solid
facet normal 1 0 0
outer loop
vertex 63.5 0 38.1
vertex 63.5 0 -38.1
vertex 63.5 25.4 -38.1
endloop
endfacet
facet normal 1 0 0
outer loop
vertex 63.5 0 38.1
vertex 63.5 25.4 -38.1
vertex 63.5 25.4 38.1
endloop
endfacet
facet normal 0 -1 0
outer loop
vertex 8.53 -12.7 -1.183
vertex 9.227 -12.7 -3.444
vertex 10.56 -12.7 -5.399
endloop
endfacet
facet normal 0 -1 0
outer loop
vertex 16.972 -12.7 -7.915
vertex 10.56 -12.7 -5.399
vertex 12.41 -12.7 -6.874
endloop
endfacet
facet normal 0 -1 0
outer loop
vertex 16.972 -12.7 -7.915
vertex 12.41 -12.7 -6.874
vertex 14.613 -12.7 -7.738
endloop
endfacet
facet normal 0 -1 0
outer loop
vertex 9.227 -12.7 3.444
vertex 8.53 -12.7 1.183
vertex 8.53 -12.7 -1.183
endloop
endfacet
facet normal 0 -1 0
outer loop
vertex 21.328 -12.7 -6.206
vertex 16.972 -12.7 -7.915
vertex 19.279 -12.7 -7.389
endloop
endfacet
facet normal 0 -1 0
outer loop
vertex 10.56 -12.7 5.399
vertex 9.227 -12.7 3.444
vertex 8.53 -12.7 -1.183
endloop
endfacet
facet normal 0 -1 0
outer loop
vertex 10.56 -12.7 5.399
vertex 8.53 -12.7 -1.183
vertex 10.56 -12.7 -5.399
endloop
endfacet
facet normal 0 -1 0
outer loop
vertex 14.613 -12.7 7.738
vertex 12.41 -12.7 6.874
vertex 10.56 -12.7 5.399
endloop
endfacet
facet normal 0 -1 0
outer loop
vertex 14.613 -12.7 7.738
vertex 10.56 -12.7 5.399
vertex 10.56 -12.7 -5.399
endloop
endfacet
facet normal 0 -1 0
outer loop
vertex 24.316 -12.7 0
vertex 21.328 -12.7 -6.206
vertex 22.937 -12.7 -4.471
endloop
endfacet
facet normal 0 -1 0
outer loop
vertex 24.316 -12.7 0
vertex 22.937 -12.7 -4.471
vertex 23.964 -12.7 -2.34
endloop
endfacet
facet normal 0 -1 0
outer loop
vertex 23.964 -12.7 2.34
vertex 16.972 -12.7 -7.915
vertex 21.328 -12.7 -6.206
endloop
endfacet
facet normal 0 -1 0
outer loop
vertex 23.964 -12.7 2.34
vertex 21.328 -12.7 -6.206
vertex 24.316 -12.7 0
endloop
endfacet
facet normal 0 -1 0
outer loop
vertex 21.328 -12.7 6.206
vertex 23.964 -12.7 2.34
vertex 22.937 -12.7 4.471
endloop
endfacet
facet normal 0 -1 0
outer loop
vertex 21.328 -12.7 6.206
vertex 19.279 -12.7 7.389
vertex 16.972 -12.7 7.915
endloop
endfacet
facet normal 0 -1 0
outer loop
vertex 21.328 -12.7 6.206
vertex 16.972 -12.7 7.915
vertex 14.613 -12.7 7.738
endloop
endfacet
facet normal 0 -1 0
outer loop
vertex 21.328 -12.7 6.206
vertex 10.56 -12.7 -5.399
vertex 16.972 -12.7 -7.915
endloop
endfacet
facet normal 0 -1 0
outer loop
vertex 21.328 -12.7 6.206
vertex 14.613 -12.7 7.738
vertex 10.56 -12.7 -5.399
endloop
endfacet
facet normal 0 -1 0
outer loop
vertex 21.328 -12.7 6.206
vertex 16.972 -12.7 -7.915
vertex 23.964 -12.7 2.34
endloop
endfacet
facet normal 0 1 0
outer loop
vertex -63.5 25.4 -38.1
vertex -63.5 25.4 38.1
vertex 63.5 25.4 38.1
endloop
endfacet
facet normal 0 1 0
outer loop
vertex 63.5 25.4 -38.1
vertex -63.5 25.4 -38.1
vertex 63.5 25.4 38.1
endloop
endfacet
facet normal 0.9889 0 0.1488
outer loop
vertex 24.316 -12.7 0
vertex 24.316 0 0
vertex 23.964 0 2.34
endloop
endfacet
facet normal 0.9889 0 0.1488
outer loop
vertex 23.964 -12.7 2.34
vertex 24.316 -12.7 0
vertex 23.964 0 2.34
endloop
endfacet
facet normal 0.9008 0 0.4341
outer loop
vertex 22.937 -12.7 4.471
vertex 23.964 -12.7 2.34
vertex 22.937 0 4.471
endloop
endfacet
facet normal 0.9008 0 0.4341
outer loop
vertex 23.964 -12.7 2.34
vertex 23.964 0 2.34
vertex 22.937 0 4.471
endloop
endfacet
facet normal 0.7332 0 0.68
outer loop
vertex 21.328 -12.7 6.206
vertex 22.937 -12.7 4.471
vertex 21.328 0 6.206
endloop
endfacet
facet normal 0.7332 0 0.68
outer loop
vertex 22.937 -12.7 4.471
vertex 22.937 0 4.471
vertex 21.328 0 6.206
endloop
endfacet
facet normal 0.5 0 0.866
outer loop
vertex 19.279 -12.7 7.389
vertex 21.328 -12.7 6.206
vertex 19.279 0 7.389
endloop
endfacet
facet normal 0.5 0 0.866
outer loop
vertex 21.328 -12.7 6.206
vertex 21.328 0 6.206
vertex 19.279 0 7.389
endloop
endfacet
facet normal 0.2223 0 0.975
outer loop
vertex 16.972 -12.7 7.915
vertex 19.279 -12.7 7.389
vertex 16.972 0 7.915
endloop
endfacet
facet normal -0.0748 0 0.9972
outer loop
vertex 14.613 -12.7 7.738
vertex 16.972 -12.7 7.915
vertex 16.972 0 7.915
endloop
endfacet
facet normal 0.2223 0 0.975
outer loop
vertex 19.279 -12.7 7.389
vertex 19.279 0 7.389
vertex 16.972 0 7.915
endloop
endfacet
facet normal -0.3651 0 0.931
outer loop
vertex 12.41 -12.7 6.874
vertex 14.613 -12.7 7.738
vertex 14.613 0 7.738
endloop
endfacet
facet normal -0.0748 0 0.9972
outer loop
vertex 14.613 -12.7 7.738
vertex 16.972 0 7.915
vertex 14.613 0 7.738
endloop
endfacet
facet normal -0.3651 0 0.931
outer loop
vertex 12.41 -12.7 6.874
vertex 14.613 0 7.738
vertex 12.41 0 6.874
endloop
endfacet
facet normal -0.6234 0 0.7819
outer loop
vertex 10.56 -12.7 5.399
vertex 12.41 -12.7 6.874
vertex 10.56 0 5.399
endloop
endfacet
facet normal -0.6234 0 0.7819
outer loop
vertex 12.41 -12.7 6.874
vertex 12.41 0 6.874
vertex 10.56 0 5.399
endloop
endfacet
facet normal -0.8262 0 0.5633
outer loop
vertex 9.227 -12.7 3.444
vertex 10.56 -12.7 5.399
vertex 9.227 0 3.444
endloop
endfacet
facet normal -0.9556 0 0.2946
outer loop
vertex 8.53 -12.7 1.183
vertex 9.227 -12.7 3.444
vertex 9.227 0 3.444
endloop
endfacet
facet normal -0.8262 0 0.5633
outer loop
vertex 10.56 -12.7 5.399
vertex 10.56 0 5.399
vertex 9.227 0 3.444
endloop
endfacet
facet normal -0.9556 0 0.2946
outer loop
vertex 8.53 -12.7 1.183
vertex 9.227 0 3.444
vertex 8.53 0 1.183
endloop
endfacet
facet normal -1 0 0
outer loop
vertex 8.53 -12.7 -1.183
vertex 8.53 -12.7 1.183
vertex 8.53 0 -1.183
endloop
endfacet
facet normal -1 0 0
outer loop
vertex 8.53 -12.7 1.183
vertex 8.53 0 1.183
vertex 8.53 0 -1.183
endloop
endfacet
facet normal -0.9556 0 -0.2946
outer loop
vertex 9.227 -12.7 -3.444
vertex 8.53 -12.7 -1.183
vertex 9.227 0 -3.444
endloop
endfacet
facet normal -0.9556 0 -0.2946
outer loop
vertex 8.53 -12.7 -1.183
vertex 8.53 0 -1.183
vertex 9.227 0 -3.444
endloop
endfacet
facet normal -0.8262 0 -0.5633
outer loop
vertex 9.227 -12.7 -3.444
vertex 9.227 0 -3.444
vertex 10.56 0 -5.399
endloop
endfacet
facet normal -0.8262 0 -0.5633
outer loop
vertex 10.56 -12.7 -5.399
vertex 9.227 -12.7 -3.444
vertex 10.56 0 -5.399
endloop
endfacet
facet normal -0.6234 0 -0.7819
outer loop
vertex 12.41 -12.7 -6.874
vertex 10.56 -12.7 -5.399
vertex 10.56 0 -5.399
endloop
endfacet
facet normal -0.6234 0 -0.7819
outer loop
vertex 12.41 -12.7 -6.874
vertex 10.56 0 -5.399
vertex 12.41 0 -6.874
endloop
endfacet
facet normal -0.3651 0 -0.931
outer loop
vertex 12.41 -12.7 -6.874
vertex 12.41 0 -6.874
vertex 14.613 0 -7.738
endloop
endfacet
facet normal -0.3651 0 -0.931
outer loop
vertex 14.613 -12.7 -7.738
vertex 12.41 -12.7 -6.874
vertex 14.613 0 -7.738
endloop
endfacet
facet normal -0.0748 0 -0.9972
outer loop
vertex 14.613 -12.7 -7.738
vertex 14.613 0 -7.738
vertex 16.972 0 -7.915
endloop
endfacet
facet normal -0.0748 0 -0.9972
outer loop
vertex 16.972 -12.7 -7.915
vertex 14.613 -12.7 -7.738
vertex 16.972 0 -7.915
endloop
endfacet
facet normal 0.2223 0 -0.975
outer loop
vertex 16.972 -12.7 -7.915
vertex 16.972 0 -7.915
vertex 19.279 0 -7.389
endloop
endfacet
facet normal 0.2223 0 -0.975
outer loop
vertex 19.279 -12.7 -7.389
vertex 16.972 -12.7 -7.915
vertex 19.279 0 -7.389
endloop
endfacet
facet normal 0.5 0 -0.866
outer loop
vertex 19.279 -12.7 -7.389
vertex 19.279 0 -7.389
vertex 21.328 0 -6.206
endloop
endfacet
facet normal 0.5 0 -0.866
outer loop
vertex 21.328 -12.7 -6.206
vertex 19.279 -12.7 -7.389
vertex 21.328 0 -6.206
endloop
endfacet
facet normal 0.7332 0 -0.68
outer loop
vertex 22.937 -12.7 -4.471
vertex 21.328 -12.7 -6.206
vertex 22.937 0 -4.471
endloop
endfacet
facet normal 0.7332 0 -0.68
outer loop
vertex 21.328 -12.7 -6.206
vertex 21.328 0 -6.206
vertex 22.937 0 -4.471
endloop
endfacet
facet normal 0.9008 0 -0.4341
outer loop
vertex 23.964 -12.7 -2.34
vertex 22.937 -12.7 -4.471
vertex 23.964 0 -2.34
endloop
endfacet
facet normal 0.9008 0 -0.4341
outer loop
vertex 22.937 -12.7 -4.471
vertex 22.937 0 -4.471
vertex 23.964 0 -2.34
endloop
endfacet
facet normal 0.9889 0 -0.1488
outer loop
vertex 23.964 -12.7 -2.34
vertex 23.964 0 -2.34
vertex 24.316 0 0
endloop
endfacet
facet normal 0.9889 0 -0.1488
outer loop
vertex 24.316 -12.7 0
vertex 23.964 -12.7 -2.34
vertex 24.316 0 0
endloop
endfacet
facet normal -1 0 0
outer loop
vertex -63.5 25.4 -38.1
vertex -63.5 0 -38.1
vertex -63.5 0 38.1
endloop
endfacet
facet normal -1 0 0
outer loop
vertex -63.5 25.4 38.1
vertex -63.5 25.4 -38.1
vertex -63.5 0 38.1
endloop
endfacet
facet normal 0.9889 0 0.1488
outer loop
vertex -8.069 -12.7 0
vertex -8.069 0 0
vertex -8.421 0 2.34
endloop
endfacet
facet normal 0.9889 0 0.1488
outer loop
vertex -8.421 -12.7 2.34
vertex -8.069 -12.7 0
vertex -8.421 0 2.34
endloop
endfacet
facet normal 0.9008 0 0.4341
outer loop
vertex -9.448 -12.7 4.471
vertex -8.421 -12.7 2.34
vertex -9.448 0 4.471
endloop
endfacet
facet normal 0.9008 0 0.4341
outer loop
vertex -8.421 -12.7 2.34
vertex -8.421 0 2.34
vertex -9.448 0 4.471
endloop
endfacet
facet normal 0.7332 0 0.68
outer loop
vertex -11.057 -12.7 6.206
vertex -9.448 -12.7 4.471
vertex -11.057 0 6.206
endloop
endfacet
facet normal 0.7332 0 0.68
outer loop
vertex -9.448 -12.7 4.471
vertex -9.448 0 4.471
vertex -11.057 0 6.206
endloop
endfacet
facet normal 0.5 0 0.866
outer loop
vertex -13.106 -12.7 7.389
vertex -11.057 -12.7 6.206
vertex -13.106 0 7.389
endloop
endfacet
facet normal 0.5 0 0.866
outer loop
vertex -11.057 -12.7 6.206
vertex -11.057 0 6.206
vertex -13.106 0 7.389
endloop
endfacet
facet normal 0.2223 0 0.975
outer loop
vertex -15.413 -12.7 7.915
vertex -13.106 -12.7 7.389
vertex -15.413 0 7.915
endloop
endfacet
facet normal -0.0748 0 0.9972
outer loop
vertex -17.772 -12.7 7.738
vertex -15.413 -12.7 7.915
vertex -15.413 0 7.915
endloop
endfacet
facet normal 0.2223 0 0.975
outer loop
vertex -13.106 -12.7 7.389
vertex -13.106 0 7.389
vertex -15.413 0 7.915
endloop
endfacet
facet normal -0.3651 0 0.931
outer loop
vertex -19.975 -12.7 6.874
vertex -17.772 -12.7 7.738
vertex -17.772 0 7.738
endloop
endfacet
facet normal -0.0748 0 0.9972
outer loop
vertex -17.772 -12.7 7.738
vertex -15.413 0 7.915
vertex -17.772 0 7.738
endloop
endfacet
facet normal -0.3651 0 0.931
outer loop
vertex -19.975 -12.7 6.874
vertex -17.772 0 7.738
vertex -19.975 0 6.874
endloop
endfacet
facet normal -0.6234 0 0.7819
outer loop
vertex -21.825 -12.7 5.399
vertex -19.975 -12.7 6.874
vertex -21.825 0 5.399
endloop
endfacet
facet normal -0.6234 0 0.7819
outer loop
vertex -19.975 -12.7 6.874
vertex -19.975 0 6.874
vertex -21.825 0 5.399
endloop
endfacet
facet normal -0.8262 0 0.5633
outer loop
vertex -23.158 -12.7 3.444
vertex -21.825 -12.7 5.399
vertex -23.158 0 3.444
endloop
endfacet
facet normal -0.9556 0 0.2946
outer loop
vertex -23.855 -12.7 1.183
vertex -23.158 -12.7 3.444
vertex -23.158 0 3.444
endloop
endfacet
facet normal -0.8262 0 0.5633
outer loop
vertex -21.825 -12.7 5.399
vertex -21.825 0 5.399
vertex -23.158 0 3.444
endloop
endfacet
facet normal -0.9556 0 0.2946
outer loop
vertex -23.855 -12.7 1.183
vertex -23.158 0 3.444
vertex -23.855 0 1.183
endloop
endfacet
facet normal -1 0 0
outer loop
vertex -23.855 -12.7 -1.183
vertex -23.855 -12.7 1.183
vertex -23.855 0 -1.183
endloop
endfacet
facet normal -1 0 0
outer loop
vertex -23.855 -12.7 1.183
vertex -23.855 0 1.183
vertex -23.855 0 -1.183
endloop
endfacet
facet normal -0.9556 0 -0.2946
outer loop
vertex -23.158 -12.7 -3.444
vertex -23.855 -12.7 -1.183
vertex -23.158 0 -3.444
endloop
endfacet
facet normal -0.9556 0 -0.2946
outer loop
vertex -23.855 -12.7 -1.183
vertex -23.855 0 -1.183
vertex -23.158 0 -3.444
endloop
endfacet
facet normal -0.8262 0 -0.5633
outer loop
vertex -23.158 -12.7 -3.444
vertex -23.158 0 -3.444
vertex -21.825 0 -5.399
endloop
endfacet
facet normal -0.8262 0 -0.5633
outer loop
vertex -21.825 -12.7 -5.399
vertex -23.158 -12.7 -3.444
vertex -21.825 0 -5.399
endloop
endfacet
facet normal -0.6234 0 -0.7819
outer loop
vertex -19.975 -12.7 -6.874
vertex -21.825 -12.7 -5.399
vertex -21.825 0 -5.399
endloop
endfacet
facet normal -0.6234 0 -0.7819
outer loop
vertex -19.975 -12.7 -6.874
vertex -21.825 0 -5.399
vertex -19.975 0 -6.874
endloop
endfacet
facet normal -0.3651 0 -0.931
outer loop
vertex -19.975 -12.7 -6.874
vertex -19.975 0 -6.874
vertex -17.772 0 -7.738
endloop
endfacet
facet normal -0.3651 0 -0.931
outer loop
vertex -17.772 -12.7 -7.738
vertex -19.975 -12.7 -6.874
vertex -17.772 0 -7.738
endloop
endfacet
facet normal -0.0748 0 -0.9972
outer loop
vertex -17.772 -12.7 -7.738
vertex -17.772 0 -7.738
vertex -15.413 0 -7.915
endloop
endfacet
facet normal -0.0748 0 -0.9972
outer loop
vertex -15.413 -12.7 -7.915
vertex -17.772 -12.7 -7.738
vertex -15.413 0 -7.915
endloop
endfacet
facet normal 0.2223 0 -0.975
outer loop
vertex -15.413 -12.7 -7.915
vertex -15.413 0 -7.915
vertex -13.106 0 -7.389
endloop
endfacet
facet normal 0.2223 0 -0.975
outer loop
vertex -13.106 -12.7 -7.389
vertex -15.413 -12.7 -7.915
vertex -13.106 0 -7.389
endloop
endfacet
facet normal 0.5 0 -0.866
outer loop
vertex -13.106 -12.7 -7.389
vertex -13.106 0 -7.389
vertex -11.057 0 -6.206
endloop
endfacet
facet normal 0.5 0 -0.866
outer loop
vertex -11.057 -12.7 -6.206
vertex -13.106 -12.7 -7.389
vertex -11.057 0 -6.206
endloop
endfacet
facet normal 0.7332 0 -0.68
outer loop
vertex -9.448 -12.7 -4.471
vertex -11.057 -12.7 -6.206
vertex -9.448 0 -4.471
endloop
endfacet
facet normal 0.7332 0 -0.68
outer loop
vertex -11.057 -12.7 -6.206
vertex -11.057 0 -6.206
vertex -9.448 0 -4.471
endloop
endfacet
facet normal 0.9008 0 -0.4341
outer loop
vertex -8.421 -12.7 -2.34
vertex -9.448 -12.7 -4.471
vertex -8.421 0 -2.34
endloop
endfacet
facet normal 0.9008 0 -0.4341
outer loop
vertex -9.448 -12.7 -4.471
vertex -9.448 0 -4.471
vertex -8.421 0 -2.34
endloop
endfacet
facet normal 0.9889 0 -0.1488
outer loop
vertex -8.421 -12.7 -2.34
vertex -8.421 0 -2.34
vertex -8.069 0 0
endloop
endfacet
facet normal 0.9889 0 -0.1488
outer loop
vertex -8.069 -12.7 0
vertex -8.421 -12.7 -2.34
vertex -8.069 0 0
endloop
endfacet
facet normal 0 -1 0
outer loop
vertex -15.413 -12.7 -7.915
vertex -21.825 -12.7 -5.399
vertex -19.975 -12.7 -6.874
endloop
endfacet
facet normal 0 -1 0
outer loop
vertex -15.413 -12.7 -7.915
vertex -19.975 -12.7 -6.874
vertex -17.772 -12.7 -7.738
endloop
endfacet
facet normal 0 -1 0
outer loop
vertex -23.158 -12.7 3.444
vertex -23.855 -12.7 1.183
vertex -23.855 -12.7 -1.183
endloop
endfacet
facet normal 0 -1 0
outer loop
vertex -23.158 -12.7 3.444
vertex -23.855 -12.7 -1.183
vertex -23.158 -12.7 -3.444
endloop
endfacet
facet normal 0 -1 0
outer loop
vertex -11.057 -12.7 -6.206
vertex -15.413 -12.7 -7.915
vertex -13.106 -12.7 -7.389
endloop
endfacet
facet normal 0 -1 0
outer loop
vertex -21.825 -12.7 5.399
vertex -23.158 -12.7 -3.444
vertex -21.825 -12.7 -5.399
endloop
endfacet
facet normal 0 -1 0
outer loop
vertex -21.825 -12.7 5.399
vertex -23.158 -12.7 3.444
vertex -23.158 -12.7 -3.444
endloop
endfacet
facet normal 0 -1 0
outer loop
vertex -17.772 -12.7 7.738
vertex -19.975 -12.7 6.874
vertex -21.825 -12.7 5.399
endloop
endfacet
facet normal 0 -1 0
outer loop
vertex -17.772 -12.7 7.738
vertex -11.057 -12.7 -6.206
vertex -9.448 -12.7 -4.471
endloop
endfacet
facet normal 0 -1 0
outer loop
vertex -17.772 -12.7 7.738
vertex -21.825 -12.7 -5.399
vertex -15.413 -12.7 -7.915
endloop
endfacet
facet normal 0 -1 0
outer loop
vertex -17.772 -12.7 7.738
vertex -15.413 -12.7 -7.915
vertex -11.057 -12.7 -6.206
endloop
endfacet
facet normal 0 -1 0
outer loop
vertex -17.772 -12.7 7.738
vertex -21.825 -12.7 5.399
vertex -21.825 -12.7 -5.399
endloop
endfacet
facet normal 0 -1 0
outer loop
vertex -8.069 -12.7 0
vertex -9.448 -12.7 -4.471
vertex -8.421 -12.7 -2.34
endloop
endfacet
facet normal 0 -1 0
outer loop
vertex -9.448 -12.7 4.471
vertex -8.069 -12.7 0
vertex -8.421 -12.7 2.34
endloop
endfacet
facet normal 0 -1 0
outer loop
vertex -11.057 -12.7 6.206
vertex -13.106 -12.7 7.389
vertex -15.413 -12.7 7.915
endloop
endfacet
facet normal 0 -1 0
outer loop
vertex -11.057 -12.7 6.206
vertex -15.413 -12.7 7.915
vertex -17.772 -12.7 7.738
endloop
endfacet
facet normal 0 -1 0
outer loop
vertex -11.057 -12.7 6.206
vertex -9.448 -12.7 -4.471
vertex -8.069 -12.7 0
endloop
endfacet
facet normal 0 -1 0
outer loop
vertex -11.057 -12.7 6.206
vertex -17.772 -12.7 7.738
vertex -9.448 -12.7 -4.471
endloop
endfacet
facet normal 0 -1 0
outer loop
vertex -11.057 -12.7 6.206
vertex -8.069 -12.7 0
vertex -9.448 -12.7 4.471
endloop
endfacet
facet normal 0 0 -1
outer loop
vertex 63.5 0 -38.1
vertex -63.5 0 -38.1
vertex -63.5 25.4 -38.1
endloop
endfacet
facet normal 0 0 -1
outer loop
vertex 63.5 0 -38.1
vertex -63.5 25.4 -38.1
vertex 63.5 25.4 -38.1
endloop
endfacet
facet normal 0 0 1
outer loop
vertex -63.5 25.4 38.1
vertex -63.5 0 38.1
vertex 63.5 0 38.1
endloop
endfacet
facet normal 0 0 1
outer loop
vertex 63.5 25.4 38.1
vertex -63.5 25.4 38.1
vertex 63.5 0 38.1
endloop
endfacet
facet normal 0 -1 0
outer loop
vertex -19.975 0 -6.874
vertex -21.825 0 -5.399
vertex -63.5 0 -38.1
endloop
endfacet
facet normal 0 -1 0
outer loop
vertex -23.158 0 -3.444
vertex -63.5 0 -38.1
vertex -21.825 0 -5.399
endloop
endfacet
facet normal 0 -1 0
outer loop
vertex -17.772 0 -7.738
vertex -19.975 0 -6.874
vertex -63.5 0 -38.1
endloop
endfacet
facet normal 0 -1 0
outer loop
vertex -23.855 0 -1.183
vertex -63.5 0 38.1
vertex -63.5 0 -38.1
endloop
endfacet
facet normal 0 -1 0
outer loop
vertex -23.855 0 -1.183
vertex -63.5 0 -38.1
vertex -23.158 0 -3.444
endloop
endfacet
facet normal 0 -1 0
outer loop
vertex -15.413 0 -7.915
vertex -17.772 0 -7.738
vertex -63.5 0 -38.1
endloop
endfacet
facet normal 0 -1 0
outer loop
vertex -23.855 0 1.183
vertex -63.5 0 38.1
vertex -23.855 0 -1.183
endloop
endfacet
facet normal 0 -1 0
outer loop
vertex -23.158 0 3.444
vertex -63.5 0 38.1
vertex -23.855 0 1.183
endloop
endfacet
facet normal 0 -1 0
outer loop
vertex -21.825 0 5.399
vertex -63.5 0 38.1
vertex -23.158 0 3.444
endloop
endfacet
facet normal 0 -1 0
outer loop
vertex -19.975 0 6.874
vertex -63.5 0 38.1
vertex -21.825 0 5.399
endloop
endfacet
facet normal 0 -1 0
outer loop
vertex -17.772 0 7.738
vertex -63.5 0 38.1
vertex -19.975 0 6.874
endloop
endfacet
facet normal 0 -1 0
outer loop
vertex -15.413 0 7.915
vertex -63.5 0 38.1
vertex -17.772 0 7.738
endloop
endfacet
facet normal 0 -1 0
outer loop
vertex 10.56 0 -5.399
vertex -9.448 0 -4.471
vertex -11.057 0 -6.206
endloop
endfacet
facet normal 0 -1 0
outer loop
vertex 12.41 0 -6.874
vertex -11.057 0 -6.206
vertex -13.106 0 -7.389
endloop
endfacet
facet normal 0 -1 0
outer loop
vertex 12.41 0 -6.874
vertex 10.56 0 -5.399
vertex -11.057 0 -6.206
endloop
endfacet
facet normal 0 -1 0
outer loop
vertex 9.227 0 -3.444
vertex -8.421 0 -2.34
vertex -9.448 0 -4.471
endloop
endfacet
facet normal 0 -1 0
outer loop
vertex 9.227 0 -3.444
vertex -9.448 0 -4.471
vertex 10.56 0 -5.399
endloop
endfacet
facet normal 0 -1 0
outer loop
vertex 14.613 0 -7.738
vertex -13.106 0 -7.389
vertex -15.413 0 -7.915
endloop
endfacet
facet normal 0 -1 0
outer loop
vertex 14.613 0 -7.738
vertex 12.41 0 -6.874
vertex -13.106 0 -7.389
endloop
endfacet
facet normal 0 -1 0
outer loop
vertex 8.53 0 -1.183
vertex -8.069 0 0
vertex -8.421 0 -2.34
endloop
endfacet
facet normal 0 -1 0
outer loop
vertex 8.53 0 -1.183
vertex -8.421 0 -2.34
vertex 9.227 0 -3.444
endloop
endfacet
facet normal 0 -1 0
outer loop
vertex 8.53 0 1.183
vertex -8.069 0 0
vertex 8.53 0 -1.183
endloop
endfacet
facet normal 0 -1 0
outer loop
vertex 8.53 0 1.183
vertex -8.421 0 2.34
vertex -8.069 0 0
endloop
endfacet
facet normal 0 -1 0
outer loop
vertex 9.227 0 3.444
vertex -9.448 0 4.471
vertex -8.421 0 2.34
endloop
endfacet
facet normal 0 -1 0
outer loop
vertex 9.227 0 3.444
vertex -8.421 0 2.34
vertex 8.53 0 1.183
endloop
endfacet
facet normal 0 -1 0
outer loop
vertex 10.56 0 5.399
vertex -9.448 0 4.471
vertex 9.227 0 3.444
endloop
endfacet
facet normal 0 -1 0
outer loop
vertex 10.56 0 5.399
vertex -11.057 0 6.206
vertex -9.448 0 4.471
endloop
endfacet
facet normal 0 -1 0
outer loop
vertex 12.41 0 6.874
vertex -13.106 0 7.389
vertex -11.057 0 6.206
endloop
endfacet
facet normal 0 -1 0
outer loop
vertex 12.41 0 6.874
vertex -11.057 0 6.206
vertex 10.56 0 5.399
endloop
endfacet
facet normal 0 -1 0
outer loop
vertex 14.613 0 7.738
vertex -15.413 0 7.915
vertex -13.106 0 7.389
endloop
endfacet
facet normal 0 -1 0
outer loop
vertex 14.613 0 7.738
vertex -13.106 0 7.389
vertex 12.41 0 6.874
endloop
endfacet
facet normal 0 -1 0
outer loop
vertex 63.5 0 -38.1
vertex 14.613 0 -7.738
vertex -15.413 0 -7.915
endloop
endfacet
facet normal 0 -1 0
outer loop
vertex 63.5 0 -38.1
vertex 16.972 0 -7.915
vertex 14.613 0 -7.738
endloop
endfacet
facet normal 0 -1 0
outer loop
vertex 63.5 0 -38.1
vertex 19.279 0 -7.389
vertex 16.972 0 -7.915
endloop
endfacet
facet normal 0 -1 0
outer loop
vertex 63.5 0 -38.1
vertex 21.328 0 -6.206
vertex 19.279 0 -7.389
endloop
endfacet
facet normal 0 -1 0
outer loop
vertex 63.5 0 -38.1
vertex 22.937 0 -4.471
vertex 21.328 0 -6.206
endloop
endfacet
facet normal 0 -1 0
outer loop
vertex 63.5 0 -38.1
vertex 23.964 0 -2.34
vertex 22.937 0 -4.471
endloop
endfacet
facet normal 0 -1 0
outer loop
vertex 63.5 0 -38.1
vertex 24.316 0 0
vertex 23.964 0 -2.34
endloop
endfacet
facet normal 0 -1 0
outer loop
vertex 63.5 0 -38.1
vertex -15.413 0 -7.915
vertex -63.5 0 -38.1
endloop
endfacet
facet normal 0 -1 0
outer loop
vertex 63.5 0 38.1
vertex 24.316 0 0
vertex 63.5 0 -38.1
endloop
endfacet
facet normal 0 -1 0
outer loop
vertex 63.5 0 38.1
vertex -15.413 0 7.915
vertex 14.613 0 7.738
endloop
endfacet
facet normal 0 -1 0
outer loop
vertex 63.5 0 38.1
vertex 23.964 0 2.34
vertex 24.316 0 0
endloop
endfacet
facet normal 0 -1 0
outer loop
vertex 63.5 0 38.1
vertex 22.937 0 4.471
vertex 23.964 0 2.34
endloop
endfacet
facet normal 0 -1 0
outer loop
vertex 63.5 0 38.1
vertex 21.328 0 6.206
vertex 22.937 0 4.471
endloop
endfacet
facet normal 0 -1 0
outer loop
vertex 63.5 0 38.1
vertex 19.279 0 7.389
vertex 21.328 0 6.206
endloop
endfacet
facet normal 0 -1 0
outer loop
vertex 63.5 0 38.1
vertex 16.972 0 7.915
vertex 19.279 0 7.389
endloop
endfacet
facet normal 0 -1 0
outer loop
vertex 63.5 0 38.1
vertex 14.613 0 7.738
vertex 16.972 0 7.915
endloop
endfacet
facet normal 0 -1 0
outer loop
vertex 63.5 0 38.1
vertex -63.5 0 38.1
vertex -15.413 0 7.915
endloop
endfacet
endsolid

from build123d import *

# Parameters (mm, degrees)
F0_W     = 127
F0_H     = 76.2
F1_DEPTH = 25.4
F2_R     = 7.9375
F3_DEPTH = 12.7


with BuildPart() as f1:
    # F0 (on Front) → F1 (new body)
    with BuildSketch(Plane.XZ):
        Rectangle(F0_W, F0_H)
    extrude(amount=-F1_DEPTH)

    # F2 (on Front) → F3 (join)
    with BuildSketch(Plane.XZ):
        with Locations((-16.006199, 0)):
            Circle(F2_R)
        with Locations((16.378801, 0)):
            Circle(F2_R)
    extrude(amount=F3_DEPTH)


solid = f1.part
